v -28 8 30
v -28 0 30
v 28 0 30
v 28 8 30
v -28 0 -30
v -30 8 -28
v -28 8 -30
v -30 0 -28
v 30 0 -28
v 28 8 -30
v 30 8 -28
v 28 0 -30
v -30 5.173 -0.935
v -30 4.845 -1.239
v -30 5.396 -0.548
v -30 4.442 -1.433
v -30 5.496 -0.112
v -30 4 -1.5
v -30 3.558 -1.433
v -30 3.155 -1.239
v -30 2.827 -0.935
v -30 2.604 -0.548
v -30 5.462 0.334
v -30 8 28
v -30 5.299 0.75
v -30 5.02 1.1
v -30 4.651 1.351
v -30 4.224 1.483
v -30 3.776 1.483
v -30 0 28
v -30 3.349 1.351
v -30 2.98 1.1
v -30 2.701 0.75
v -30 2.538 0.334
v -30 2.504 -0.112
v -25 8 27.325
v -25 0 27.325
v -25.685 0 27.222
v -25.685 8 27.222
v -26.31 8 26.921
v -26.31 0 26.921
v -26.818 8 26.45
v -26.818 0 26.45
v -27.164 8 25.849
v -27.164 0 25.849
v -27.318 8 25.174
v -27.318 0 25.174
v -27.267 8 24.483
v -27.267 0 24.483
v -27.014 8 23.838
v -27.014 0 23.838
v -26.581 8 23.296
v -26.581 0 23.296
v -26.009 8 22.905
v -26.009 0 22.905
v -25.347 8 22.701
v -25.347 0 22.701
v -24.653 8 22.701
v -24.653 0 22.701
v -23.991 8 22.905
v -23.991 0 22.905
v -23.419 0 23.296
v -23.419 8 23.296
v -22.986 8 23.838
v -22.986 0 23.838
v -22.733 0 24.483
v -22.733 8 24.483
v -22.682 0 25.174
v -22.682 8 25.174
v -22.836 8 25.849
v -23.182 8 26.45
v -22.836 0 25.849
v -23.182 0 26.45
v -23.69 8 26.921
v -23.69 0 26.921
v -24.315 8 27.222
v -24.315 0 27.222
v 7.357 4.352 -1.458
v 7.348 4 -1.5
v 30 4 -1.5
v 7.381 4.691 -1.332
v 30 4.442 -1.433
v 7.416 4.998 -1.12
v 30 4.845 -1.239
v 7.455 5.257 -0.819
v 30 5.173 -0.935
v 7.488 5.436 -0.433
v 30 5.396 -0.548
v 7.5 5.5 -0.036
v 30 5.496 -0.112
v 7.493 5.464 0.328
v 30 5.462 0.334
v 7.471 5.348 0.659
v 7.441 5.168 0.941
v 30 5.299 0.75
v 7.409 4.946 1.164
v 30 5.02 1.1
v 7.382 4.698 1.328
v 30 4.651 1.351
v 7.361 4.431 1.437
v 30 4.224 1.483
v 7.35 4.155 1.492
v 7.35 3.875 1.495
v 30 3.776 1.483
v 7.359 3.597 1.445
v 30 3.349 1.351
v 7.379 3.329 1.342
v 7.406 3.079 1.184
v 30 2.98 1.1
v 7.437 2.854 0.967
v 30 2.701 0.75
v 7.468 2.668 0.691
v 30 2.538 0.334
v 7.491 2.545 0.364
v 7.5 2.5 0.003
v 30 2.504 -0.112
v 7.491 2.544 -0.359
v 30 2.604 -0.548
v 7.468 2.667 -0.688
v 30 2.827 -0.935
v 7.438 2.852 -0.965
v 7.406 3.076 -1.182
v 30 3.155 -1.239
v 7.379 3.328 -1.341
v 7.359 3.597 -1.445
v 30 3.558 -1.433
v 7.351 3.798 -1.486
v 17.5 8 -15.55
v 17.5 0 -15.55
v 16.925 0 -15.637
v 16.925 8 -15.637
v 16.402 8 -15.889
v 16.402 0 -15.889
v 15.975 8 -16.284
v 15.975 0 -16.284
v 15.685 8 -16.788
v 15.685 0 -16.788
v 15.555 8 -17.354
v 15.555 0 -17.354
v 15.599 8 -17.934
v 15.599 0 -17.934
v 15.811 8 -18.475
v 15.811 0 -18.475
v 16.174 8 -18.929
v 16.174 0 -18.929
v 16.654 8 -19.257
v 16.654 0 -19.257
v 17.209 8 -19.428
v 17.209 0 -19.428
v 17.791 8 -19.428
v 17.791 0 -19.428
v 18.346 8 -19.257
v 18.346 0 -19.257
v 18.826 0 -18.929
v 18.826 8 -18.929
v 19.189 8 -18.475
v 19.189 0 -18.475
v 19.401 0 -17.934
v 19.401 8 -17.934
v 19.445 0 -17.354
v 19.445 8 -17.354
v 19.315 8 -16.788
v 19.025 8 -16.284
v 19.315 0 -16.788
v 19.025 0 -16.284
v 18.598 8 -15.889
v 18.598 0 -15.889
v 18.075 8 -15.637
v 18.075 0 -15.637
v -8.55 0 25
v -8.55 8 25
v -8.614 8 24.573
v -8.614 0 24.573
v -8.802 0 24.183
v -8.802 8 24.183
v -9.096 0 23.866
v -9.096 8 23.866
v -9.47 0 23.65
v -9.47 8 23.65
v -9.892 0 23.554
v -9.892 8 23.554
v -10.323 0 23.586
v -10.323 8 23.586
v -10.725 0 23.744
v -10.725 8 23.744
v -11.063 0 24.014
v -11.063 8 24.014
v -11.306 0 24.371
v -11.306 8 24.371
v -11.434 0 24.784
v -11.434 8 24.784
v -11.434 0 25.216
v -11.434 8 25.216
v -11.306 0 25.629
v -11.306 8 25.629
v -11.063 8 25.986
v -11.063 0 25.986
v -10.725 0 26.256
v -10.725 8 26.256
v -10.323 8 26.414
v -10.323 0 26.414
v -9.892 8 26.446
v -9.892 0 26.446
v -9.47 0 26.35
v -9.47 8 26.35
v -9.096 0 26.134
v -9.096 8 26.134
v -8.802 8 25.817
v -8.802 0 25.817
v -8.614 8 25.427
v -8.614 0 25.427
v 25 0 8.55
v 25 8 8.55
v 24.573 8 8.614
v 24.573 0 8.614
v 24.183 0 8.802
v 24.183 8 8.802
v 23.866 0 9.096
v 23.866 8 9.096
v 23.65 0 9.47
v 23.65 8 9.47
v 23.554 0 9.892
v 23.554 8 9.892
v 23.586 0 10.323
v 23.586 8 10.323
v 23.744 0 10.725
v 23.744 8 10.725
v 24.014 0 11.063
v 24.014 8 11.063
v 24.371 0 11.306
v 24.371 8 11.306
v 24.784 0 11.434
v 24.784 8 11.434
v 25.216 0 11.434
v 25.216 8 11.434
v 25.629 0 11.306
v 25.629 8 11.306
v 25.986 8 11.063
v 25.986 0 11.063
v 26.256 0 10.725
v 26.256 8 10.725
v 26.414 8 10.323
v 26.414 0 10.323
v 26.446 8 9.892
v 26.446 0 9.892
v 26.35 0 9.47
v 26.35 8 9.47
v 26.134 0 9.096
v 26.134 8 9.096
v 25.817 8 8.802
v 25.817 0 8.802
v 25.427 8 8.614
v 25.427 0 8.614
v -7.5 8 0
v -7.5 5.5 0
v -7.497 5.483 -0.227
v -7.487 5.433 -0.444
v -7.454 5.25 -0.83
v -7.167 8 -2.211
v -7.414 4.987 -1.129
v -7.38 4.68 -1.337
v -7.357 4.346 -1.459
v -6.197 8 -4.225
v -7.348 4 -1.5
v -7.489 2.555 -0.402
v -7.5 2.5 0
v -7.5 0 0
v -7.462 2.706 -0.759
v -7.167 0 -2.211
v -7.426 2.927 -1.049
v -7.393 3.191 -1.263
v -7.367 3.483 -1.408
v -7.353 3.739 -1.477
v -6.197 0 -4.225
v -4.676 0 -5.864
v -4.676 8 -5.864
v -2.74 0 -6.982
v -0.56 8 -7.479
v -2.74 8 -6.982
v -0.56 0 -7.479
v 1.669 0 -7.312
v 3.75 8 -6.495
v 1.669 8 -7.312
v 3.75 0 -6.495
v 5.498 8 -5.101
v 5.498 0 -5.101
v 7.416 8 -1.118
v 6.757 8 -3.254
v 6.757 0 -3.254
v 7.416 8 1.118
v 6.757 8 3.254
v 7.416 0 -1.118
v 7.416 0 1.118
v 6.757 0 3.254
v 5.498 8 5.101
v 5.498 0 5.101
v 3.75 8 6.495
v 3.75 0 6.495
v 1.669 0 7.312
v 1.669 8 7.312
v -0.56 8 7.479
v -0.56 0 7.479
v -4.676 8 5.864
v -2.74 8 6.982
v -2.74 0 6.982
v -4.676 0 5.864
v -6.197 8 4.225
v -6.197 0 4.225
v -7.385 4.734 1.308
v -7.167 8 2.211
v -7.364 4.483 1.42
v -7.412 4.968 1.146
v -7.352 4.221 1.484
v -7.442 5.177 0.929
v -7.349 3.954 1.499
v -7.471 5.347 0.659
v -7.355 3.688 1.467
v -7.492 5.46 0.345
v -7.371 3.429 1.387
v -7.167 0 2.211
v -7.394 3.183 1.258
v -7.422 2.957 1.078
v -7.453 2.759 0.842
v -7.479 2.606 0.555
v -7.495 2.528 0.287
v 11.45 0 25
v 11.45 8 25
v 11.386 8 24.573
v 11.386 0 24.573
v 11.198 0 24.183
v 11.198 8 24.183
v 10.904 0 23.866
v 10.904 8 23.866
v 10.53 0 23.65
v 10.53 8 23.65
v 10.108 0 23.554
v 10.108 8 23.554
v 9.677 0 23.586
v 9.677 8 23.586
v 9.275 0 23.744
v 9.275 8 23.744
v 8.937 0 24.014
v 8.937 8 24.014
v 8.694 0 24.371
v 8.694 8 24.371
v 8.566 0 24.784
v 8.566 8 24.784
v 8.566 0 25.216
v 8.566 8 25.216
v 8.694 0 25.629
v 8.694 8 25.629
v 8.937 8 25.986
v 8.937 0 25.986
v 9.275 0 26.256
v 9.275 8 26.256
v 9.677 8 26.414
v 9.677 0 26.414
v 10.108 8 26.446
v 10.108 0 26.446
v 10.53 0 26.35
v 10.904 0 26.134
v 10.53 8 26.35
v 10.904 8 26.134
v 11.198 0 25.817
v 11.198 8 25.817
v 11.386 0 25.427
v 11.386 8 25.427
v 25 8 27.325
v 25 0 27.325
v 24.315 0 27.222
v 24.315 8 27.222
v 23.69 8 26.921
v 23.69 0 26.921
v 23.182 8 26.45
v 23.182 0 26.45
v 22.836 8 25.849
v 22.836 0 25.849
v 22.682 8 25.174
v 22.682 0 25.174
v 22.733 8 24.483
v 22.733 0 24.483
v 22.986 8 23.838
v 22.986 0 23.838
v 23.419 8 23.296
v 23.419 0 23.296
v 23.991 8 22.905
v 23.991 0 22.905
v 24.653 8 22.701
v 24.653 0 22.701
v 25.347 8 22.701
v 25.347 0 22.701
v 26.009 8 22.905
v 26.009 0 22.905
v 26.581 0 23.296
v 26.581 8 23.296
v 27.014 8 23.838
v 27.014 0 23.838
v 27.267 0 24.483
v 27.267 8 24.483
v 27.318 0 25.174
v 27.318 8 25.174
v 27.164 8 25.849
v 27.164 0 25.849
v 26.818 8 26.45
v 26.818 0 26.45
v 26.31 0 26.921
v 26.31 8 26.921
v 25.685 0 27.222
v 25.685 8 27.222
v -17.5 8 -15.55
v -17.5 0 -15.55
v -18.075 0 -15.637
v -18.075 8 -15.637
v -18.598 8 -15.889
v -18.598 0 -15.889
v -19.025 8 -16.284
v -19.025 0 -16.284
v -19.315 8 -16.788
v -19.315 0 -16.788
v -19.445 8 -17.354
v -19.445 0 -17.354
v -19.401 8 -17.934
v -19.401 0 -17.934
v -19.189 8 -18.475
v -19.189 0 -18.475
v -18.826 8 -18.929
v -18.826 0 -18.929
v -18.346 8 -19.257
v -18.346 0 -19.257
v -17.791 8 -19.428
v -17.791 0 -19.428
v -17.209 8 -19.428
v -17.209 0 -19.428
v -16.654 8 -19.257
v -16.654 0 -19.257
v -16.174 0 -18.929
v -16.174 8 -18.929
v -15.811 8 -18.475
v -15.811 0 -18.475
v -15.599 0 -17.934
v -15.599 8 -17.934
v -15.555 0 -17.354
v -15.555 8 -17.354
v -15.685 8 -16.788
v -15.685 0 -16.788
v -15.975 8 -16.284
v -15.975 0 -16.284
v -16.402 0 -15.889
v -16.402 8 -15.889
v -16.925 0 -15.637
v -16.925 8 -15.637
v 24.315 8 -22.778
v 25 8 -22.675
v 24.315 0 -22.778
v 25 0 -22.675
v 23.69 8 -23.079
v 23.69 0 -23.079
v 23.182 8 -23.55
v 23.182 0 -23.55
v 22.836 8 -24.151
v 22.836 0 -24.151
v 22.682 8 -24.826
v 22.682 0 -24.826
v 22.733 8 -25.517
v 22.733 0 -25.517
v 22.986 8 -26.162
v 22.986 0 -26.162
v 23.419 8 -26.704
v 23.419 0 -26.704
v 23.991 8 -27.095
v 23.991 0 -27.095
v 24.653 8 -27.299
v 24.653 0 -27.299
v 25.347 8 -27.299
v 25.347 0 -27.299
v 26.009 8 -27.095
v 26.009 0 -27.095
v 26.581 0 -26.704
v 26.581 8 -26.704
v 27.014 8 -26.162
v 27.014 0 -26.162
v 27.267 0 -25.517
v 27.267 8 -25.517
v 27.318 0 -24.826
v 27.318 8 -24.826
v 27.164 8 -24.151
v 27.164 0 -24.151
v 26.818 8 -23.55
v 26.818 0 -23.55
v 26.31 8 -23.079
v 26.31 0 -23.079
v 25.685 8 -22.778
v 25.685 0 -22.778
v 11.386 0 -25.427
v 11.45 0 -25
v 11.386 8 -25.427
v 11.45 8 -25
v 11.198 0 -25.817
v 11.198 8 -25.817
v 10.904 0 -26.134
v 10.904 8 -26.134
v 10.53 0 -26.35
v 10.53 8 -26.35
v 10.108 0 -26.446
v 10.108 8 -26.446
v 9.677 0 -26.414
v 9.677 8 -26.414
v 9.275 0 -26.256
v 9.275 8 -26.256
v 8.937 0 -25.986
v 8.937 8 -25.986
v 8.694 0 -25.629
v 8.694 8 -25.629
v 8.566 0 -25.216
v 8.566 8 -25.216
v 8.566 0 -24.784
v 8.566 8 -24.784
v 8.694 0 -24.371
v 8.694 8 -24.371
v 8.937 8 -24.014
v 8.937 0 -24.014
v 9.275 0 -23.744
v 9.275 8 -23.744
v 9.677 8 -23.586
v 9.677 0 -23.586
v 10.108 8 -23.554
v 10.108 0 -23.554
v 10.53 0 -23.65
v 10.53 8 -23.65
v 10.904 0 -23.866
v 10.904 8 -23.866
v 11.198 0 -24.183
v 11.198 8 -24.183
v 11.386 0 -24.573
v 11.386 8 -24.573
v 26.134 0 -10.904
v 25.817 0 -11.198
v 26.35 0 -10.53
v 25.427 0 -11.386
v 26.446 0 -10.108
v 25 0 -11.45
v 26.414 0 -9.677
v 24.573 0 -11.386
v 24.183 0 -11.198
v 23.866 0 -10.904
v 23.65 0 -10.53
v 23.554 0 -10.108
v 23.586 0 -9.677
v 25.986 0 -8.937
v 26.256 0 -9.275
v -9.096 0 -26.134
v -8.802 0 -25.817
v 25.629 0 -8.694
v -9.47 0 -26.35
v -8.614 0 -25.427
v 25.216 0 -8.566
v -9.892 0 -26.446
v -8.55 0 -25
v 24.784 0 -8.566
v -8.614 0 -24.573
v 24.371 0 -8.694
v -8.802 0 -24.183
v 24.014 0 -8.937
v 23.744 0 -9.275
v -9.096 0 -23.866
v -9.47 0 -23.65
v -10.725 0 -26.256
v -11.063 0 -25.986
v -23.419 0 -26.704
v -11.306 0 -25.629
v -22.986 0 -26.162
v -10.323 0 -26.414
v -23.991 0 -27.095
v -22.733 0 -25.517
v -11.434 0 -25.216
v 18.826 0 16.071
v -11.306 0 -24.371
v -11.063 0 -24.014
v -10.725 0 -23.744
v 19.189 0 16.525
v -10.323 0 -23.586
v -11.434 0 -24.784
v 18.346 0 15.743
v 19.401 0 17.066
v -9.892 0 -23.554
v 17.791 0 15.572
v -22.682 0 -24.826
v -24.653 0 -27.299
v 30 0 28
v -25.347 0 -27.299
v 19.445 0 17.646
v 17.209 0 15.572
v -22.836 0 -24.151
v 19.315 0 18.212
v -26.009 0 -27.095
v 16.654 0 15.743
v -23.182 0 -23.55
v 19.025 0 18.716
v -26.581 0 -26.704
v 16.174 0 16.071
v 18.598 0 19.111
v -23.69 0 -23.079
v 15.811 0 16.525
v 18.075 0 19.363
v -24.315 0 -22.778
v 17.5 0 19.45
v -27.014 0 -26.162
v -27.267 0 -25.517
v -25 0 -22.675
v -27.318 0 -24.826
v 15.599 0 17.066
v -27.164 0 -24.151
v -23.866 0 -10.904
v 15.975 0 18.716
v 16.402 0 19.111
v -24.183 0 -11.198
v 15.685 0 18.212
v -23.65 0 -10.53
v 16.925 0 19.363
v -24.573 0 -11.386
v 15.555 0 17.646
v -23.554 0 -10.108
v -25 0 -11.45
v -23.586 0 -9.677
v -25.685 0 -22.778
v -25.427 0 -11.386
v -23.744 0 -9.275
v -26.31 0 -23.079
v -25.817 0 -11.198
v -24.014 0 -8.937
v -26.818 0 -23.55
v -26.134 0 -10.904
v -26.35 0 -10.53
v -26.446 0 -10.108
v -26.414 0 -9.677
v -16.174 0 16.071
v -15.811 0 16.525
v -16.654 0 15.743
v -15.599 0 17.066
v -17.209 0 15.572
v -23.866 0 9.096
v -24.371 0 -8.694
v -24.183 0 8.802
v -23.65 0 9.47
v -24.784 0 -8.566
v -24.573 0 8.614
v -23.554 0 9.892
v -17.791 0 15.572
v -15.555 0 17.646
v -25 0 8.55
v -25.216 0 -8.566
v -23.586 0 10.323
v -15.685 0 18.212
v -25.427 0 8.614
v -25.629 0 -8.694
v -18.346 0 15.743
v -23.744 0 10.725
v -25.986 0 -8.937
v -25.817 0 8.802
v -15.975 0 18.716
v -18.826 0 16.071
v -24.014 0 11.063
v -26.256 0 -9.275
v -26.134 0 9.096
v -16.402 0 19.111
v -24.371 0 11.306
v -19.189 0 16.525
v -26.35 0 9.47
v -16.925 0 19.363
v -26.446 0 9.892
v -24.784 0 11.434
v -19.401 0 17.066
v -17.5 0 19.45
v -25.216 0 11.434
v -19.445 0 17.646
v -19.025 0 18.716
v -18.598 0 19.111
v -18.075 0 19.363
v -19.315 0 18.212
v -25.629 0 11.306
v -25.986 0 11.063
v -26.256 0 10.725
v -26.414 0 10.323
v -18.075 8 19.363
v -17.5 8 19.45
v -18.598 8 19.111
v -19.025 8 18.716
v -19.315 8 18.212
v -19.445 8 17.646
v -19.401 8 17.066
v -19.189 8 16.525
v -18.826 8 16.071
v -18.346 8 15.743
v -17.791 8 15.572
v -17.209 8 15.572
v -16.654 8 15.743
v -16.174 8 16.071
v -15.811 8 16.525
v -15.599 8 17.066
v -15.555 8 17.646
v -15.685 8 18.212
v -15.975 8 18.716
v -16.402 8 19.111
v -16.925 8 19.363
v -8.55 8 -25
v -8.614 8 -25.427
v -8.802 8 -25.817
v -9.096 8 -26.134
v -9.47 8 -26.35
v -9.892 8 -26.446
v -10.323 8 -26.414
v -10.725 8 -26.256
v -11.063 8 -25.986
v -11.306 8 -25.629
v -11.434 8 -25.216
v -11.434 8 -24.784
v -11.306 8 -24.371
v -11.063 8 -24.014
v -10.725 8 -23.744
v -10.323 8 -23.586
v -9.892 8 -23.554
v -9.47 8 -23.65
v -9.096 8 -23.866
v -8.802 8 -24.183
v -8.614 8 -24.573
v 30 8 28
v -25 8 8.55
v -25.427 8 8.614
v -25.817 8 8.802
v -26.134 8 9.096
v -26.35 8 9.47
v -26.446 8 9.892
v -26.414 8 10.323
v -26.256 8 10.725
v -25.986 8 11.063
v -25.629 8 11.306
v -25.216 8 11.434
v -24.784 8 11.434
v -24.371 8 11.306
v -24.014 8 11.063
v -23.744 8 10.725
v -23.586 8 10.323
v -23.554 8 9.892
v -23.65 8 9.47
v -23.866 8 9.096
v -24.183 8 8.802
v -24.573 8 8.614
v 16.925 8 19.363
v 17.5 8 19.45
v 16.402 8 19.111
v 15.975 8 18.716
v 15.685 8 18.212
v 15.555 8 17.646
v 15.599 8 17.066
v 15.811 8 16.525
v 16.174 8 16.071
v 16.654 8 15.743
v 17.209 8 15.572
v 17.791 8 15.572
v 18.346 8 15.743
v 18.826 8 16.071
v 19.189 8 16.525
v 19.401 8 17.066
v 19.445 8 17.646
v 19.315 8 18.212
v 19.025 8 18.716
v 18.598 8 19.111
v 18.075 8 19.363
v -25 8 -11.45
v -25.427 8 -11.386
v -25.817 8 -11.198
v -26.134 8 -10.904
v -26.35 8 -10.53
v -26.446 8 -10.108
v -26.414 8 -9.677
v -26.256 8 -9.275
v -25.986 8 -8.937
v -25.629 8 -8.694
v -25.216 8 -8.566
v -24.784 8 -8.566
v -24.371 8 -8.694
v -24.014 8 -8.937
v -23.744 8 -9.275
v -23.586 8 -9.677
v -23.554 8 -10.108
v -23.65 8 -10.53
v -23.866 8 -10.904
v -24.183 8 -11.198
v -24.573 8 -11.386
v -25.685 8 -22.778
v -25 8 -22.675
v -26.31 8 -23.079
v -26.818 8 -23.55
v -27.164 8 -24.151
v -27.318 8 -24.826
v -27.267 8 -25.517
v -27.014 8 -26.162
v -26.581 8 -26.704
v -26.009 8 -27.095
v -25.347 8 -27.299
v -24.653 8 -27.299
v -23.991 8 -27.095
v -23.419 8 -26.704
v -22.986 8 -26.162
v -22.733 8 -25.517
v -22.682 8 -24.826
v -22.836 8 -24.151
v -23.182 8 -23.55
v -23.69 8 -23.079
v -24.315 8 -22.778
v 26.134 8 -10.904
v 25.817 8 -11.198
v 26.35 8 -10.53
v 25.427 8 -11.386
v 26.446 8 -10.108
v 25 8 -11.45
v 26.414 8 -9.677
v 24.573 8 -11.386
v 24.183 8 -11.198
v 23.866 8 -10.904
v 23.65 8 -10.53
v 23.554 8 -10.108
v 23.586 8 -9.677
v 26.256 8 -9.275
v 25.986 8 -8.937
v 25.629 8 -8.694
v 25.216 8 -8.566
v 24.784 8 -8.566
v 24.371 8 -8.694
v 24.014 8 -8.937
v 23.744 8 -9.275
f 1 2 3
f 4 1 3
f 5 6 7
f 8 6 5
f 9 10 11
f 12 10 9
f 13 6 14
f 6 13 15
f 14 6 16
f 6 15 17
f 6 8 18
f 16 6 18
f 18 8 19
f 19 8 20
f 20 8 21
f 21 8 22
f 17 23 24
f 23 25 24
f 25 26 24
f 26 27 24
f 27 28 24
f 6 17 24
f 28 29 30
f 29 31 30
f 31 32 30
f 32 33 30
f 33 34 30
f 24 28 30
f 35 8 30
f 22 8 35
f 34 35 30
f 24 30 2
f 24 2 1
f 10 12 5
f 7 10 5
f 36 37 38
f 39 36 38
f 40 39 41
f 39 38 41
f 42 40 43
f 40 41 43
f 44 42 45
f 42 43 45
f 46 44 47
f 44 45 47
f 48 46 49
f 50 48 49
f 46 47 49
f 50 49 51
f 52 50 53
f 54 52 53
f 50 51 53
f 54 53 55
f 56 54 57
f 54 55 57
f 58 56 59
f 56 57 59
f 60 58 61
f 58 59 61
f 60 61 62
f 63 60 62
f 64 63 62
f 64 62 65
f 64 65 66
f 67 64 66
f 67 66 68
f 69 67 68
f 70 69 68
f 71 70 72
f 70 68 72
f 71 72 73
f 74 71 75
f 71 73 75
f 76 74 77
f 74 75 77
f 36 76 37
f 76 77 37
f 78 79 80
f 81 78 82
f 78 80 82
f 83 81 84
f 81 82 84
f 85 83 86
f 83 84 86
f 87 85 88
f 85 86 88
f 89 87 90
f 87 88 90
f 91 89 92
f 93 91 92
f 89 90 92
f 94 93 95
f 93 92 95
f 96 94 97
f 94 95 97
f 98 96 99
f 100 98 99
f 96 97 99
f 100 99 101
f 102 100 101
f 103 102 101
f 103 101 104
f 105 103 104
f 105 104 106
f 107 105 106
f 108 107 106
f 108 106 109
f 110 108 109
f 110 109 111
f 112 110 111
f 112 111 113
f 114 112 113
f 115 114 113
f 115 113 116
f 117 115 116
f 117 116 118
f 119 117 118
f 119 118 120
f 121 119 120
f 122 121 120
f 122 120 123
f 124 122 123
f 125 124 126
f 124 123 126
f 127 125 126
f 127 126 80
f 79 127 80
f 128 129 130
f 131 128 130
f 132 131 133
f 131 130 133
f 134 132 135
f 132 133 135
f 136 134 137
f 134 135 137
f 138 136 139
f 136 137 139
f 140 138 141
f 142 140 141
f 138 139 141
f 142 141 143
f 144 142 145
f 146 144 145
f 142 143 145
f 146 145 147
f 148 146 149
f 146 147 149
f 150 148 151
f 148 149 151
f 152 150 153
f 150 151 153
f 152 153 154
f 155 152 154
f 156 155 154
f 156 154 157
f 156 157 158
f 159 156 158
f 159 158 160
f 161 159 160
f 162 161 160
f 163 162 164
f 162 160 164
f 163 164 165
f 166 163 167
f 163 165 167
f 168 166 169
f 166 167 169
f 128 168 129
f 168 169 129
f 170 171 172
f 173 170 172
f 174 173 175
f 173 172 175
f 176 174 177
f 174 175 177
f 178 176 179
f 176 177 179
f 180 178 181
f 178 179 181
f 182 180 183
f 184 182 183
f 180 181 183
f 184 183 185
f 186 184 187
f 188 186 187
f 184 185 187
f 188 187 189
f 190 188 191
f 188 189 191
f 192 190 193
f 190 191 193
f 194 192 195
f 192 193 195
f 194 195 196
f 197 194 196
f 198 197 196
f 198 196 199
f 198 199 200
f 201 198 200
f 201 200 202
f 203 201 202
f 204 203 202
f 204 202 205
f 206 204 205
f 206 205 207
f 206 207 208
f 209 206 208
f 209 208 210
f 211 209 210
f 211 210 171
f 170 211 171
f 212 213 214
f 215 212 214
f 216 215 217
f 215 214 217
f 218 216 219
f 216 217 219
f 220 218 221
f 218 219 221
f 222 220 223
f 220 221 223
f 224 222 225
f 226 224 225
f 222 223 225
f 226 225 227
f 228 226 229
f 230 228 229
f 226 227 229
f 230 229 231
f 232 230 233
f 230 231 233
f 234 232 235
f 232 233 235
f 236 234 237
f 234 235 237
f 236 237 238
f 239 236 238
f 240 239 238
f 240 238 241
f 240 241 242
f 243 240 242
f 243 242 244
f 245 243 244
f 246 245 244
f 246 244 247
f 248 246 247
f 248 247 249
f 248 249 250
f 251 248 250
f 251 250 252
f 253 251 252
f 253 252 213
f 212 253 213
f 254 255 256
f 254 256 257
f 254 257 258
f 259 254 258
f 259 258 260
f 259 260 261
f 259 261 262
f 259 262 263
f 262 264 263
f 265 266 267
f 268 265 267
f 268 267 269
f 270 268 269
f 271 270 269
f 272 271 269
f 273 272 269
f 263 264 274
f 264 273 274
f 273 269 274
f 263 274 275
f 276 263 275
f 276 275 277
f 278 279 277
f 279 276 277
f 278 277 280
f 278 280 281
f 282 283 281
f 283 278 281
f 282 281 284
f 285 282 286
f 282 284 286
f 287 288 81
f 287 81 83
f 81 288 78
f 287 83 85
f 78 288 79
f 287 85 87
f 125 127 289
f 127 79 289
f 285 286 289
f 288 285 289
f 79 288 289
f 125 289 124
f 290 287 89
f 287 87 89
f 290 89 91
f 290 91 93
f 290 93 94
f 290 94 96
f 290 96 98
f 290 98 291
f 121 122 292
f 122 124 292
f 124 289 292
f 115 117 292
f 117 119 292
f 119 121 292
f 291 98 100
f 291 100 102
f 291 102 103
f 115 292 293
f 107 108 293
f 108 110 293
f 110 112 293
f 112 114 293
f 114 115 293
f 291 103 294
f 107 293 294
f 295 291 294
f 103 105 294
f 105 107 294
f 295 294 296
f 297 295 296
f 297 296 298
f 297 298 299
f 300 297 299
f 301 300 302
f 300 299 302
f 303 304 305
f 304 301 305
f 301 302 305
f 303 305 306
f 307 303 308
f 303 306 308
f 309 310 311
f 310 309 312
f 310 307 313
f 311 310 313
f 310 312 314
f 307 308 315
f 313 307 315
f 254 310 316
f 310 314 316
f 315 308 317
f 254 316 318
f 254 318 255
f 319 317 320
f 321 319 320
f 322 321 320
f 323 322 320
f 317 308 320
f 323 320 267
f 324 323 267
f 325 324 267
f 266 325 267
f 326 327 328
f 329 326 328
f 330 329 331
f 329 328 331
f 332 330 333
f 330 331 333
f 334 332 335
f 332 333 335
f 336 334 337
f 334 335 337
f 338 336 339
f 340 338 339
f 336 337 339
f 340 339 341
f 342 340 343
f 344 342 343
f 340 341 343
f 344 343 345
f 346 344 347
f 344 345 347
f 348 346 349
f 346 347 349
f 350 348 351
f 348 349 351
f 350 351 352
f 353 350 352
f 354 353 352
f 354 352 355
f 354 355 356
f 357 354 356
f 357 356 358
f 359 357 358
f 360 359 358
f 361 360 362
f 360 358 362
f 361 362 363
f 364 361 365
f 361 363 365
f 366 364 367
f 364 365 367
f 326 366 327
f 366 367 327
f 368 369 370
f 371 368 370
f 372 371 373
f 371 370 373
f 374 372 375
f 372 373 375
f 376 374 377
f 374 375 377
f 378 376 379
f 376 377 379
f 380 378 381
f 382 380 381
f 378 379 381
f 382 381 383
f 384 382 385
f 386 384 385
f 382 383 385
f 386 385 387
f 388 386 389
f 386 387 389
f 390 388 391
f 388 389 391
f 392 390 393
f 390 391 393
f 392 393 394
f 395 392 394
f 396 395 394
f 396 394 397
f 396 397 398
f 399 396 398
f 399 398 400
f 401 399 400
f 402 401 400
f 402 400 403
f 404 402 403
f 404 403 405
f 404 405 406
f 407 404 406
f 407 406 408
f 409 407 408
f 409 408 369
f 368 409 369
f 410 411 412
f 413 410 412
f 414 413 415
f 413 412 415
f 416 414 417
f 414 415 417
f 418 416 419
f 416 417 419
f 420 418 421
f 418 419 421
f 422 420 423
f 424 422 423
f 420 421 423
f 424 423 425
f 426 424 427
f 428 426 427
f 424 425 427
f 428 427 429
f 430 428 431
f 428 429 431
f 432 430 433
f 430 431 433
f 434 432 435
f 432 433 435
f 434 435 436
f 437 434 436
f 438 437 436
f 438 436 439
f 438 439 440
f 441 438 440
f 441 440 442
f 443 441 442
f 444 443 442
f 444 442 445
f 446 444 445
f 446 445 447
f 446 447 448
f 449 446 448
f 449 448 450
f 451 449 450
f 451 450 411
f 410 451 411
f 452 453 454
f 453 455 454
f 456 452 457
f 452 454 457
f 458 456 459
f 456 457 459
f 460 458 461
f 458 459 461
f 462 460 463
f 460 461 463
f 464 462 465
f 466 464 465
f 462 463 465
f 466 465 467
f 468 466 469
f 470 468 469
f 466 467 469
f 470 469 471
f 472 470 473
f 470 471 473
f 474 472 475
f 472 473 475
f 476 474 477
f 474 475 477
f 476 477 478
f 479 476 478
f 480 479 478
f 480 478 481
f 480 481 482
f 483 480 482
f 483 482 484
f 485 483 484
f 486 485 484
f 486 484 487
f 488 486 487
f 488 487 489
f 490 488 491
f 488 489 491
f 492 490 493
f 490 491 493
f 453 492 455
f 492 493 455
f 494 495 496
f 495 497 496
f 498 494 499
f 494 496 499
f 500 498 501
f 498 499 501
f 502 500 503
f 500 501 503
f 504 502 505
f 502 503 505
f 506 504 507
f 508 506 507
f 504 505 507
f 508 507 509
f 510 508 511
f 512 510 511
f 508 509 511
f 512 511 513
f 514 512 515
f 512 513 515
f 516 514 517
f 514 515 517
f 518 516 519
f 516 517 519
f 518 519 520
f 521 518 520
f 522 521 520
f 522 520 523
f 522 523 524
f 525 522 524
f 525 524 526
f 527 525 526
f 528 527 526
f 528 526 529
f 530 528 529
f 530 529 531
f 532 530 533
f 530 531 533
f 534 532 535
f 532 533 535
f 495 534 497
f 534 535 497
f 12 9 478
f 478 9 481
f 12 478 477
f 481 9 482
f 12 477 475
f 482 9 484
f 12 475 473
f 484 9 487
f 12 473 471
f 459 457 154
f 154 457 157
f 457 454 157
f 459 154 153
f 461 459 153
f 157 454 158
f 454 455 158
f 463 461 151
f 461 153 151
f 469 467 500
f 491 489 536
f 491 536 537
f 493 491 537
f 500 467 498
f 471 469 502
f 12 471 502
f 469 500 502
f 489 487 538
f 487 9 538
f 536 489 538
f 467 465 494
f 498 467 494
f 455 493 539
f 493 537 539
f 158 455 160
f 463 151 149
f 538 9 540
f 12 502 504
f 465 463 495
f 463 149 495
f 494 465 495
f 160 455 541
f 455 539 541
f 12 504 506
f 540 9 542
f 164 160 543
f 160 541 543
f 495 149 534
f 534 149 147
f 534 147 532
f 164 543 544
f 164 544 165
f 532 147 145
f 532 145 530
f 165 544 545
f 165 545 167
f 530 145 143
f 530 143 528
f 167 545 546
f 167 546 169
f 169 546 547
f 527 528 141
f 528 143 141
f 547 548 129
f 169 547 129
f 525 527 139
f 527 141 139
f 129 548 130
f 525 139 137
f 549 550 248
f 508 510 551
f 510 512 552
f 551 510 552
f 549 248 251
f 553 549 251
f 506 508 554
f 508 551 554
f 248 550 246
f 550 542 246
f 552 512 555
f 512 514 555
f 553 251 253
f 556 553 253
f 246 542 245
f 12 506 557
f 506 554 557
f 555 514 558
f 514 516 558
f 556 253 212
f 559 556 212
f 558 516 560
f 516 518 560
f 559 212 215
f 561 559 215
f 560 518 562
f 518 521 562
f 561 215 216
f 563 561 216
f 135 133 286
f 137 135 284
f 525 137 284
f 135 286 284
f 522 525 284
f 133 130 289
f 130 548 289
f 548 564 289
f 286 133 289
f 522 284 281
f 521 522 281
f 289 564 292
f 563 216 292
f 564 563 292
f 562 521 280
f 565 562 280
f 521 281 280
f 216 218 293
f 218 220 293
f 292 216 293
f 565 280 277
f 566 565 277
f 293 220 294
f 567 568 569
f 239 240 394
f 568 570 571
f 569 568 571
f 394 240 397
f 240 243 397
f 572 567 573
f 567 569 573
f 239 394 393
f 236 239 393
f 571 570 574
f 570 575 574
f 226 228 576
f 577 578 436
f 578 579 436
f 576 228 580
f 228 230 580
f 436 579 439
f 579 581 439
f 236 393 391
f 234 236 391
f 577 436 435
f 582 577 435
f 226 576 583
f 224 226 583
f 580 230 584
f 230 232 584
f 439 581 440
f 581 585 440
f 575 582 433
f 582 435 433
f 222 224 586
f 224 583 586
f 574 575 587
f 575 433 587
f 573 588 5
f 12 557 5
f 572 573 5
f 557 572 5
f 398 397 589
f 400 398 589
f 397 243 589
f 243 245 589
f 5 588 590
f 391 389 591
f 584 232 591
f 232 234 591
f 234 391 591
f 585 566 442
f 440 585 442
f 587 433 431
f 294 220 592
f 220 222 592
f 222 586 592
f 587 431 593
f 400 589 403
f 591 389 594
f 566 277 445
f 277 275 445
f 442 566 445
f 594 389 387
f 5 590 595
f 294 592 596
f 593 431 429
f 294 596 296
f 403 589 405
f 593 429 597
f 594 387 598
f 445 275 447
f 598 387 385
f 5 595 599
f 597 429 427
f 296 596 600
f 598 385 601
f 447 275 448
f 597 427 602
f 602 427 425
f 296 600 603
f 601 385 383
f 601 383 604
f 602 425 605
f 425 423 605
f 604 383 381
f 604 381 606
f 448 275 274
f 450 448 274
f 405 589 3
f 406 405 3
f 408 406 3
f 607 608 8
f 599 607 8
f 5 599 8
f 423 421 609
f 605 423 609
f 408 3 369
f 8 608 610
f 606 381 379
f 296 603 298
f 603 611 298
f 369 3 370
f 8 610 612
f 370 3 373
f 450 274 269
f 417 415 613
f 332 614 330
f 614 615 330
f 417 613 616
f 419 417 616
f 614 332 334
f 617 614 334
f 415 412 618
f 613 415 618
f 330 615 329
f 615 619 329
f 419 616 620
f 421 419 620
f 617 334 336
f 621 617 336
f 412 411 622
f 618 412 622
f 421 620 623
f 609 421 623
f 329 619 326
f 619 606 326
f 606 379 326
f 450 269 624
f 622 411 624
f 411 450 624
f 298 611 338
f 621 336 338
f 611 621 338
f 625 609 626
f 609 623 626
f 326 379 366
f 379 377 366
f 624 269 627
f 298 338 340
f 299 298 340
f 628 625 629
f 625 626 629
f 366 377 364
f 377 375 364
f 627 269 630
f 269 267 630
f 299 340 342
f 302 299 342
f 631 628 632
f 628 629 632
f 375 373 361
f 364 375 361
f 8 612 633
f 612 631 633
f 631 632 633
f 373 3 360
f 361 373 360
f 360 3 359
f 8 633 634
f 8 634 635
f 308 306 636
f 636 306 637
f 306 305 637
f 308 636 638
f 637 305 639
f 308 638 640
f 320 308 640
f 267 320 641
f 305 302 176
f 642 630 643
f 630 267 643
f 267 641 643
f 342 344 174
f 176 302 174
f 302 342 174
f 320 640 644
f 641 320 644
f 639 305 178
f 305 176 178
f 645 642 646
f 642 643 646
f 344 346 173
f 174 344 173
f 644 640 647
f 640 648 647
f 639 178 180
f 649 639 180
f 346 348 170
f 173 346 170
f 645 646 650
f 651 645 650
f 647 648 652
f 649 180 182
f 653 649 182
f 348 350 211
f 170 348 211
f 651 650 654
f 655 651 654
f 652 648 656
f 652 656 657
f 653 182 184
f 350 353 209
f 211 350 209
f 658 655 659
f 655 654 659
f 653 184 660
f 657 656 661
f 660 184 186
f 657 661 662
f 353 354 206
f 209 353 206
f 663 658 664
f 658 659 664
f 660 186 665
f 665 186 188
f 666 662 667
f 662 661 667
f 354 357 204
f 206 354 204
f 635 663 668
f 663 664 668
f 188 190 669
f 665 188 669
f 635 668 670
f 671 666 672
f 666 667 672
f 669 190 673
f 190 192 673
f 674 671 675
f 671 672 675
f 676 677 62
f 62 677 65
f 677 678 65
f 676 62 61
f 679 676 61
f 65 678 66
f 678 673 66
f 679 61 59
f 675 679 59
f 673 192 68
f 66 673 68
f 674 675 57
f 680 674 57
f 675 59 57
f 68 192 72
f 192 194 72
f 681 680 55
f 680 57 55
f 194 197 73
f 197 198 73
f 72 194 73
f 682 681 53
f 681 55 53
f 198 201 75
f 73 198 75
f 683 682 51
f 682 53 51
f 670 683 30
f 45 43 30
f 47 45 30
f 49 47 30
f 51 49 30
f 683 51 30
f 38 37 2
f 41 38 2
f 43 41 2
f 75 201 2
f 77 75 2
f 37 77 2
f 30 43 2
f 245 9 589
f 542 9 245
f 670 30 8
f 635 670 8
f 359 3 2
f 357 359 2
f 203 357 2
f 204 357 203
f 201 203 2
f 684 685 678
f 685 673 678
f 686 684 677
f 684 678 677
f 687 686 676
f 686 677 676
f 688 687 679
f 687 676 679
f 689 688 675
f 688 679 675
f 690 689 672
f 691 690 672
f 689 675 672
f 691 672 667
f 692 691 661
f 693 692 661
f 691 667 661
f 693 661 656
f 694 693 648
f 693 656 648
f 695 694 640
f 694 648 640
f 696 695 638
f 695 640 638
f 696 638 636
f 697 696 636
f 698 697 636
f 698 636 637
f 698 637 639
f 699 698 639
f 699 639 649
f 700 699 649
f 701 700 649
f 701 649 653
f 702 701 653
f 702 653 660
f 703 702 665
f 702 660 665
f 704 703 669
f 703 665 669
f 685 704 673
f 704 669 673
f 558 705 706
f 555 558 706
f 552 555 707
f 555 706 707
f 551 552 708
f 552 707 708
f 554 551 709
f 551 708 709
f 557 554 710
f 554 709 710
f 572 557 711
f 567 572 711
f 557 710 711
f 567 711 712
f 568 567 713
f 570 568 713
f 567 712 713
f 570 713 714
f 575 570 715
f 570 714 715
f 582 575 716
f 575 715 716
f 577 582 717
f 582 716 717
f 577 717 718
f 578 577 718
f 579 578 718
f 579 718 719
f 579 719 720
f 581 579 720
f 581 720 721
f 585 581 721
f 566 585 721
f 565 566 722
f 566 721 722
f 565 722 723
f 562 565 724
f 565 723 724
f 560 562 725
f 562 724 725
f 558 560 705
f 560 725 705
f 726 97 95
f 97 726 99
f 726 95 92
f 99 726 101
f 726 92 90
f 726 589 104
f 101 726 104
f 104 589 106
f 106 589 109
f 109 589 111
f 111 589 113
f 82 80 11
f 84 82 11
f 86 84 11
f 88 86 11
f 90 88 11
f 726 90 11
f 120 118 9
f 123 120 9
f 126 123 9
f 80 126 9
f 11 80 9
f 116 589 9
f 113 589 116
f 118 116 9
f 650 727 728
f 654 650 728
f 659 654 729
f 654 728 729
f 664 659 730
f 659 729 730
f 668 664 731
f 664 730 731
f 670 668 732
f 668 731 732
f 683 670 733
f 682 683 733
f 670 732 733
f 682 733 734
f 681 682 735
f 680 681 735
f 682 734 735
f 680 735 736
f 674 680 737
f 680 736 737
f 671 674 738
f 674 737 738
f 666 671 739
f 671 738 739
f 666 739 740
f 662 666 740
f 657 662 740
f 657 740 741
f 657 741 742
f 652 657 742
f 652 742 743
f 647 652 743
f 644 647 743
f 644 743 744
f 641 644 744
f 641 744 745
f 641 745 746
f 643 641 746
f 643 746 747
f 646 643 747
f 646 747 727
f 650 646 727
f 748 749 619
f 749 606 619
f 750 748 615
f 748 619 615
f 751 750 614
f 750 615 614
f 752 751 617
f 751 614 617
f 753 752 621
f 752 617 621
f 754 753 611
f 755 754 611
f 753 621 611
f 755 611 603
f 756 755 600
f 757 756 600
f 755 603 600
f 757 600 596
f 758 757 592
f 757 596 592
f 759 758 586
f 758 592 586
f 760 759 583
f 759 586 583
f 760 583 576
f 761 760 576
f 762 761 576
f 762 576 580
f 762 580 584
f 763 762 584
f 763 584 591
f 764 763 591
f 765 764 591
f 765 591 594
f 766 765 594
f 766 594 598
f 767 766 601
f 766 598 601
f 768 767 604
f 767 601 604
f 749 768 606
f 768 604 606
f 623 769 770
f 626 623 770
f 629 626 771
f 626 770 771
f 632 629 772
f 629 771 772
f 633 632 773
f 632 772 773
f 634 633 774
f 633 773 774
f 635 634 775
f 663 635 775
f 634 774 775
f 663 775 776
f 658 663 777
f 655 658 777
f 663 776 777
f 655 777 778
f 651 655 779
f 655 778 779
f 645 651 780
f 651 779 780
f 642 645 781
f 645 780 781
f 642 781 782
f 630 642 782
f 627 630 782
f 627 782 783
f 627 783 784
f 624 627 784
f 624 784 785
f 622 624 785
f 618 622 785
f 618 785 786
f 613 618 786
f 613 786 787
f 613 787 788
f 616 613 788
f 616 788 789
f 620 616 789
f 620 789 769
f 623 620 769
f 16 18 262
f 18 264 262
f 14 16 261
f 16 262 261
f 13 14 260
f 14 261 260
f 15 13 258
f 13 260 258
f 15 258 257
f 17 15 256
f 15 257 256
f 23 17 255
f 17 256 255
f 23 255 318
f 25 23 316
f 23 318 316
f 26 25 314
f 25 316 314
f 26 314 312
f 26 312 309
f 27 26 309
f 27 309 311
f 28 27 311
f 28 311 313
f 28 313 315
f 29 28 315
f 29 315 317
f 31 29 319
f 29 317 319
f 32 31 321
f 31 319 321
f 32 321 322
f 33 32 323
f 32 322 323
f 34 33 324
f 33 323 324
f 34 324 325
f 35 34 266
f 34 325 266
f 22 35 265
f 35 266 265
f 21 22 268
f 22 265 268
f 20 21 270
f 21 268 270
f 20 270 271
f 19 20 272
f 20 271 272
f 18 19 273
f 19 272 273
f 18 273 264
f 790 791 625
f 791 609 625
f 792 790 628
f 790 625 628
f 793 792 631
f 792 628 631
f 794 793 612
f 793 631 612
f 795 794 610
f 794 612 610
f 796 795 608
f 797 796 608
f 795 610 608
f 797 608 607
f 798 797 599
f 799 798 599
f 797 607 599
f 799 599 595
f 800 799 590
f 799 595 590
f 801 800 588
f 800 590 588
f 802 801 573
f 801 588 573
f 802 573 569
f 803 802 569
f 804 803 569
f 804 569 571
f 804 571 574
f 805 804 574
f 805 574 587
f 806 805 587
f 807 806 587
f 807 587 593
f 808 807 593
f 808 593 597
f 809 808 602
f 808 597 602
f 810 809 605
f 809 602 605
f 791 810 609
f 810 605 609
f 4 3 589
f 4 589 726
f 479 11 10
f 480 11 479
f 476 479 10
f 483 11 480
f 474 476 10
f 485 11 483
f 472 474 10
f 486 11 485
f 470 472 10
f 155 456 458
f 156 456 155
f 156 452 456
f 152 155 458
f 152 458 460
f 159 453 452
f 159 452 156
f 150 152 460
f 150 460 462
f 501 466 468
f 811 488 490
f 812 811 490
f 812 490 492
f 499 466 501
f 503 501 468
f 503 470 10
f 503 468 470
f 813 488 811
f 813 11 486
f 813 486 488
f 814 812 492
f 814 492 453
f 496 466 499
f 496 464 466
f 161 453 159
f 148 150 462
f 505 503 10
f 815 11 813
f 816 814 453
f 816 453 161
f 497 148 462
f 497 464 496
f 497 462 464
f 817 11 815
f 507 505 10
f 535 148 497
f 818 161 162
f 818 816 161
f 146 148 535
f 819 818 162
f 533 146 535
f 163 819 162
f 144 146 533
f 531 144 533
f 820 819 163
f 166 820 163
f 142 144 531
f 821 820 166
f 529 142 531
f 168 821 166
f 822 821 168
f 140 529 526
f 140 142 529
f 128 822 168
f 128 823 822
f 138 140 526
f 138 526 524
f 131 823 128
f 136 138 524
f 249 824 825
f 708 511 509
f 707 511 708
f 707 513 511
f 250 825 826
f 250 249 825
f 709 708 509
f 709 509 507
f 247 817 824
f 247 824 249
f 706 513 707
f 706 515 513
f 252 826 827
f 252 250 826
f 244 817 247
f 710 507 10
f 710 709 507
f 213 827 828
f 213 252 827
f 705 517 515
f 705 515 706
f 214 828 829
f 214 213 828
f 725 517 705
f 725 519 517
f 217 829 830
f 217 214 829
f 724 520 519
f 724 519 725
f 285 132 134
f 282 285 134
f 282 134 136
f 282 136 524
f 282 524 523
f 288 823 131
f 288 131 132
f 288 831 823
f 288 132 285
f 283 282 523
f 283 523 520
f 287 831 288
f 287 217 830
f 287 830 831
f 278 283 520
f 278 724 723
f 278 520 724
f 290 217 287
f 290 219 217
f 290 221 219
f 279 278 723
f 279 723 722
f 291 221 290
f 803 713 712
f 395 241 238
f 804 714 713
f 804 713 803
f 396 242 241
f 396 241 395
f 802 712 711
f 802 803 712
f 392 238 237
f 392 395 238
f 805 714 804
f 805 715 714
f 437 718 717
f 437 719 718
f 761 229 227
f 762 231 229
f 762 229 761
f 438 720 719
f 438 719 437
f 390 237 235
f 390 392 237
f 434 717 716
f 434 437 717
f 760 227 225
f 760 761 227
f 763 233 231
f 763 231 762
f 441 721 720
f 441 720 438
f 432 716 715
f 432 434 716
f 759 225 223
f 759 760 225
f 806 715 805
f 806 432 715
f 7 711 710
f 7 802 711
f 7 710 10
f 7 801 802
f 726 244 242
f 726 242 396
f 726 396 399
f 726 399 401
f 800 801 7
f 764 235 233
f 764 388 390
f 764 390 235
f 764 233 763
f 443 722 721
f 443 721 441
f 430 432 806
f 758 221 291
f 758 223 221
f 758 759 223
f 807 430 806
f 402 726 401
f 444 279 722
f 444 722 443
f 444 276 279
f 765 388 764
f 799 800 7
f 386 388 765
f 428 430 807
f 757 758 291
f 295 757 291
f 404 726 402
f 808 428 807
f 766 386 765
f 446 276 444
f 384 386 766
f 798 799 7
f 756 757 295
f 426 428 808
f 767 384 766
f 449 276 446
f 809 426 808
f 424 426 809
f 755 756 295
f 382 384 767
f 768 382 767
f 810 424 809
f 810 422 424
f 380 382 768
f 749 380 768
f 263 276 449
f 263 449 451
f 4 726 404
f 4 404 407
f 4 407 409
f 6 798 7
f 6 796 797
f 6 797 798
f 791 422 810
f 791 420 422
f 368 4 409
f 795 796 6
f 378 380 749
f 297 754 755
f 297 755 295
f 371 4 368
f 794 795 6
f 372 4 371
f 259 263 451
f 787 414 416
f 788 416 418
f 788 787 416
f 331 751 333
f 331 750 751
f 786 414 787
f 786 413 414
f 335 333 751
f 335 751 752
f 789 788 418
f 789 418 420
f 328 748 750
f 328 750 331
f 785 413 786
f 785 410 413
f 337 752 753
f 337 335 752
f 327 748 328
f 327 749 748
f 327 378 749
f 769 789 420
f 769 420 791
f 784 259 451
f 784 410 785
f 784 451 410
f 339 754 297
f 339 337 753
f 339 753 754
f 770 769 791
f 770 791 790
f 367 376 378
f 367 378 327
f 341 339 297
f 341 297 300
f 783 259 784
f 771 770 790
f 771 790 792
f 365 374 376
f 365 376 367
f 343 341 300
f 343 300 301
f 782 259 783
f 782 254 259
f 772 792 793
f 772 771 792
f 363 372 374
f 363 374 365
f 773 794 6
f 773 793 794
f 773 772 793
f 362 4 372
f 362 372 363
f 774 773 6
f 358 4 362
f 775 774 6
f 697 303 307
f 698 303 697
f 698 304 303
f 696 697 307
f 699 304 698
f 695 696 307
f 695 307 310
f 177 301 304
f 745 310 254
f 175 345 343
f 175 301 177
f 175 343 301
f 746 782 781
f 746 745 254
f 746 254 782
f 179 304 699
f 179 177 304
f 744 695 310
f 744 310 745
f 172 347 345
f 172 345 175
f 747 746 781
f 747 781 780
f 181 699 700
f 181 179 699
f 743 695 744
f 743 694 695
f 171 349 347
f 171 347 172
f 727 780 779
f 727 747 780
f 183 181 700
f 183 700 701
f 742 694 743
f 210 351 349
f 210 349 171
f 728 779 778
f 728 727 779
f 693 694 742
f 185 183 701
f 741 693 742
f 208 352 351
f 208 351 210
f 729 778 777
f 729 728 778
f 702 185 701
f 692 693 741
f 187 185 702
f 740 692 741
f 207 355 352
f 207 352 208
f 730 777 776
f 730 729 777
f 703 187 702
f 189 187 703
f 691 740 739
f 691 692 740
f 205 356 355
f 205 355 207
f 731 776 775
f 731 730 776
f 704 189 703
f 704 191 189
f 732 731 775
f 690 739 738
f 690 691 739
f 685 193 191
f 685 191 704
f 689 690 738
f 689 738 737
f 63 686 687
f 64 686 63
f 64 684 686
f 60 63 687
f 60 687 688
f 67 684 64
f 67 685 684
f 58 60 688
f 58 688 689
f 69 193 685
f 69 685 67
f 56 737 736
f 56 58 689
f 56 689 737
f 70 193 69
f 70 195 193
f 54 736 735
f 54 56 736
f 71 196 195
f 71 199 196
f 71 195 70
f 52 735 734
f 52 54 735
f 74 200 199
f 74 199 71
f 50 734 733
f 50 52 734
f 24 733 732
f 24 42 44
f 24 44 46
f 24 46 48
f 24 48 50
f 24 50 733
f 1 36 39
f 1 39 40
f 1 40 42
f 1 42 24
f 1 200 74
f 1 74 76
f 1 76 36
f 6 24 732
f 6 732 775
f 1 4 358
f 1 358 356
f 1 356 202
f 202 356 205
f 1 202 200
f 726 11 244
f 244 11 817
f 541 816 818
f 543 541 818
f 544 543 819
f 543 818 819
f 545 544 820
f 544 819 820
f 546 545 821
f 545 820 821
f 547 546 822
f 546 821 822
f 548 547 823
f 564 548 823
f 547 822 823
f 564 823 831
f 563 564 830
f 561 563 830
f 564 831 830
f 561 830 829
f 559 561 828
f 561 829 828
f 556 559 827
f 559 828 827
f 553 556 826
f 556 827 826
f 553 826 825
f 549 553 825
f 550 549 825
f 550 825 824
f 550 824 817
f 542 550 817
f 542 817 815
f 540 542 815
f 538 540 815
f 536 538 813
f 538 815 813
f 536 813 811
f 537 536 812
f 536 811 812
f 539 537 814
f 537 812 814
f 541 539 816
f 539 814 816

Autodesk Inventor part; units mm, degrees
ref_plane "YZ Plane" through (0, 0, 0) normal (1, 0, 0) x (0, 1, 0)
ref_plane "XZ Plane" through (0, 0, 0) normal (0, 1, 0) x (-1, 0, 0)
ref_plane "XY Plane" through (0, 0, 0) normal (0, 0, 1) x (1, 0, 0)
sketch "Sketch1" plane through (0, 0, 0) normal (0, 1, 0) x (-1, 0, 0)
  line L0 (-30, -30) -> (30, -30)
  line L1 (30, -30) -> (30, 30)
  line L2 (30, 30) -> (-30, 30)
  line L3 (-30, 30) -> (-30, -30)
  line L4 (-30, -30) -> (30, 30) construction
  line L5 (30, -30) -> (-30, 30) construction
  circle A0 centre (0, 0) radius 7.5
  circle A1 centre (-25, 25) radius 1.95 projected
  circle A2 centre (0, 25) radius 1.95 projected
  circle A3 centre (0, 25) radius 1.95 projected
  circle A4 centre (25, 0) radius 1.95 projected
  circle A5 centre (25, -25) radius 1.95 projected
  circle A6 centre (-25, 25) radius 1.95 projected
  circle A7 centre (-25, -25) radius 1.95 projected
  circle A8 centre (25, 25) radius 1.95 projected
  circle A9 centre (-25, 0) radius 1.95 projected
  circle A10 centre (0, -25) radius 1.95 projected
  line L6 (28, 30) -> (30, 28) projected
  line L7 (30, 28) -> (30, -28) projected
  line L8 (30, -28) -> (28, -30) projected
  line L9 (28, -30) -> (-28, -30) projected
  line L10 (-28, -30) -> (-30, -28) projected
  line L11 (-30, -28) -> (-30, 28) projected
  line L12 (-30, 28) -> (-28, 30) projected
  line L13 (-28, 30) -> (28, 30) projected
  dimension "d0" = 60
  dimension "d1" = 60
  dimension "d13" = 15
extrude "Extrusion1" add sketch "Sketch1" along normal blind 8 contours L3 L10 L0 | L10 L3 L12 L2 L6 L1 L8 L0 | L8 L1 L0 | L3 L2 L12 | L6 L2 L1 | A1 | A2 | A4 | A5 | A7 | A8 | A9 | A10
sketch "Sketch2" plane through (0, 8, 0) normal (0, 1, 0) x (1, 0, 0)
  line L0 (30, 30) -> (-30, 30) projected
  line L1 (-30, 30) -> (-30, -30) projected
  line L2 (-30, -30) -> (30, -30) projected
  line L3 (30, -30) -> (30, 30) projected
  line L4 (17.5, -17.5) -> (-17.5, -17.5)
  line L5 (-17.5, -17.5) -> (-17.5, 17.5)
  line L6 (-17.5, 17.5) -> (17.5, 17.5)
  line L7 (17.5, 17.5) -> (17.5, -17.5)
  line L8 (17.5, -17.5) -> (-17.5, 17.5) construction
  line L9 (-17.5, -17.5) -> (17.5, 17.5) construction
  line L10 (0, -17.5) -> (0, 17.5)
  line L11 (-17.5, 0) -> (17.5, 0)
  point P0 (0, 0)
  dimension "d4" = 35
  dimension "d5" = 35
hole "Hole1" at (-17.5, 8, 17.5) at (-17.5, 8, -17.5) at (17.5, 8, -17.5) at (17.5, 8, 17.5) direction (0, -1, 0) diameter 3.9 depth 10 tip angle 118
chamfer "Chamfer1" distance 2 angle 45 4 edges at (30, 4, 30) (30, 4, -30) (-30, 4, -30) (-30, 4, 30)
sketch "Sketch3" plane through (0, 8, 0) normal (0, 1, 0) x (1, 0, 0)
  line L0 (-28, -30) -> (-30, -28) projected
  line L1 (-28, -30) -> (28, -30) projected
  line L2 (30, -28) -> (28, -30) projected
  line L3 (30, -28) -> (30, 28) projected
  line L4 (28, 30) -> (30, 28) projected
  line L5 (28, 30) -> (-28, 30) projected
  line L6 (-30, 28) -> (-28, 30) projected
  line L7 (-30, 28) -> (-30, -28) projected
  circle A0 centre (17.5, 17.5) radius 1.95 projected
  circle A1 centre (-17.5, -17.5) radius 1.95 projected
  circle A2 centre (-17.5, 17.5) radius 1.95 projected
  circle A3 centre (17.5, -17.5) radius 1.95 projected
  circle A4 centre (0, 0) radius 7.5 projected
  line L8 (25, -25) -> (-25, -25)
  line L9 (-25, -25) -> (-25, 25)
  line L10 (-25, 25) -> (25, 25)
  line L11 (25, 25) -> (25, -25)
  line L12 (25, -25) -> (-25, 25) construction
  line L13 (-25, -25) -> (25, 25) construction
  dimension "d17" = 50
  dimension "d18" = 50
hole "Hole2" at (-25, 8, -25) at (25, 8, -25) at (25, 8, 25) at (-25, 8, 25) direction (0, -1, 0) diameter 4.65 end through all
sketch "Sketch4" plane through (30, 0, 28) normal (1, 0, 0) x (0, 0, -1)
  line L0 (56, 8) -> (56, 0) projected
  line L1 (0, 8) -> (56, 8) projected
  line L2 (0, 0) -> (0, 8) projected
  line L3 (0, 0) -> (56, 0) projected
  circle A0 centre (28, 4) radius 1.5
  line L4 (-2, 8) -> (-2, 0) projected
  point P0 (28, 0)
  dimension "d26" = 3
  dimension "d27" = 4
  dimension "d28" = 30
extrude "Extrusion2" cut sketch "Sketch4" against normal through all contours A0
sketch "Sketch5" plane through (0, 8, 0) normal (0, 1, 0) x (1, 0, 0)
  circle A0 centre (25, -25) radius 2.325 projected
  circle A1 centre (-25, -25) radius 2.325 projected
  circle A2 centre (25, 25) radius 2.325 projected
  circle A3 centre (-25, 25) radius 2.325 projected
  circle A4 centre (10, -25) radius 1.45
  circle A5 centre (-10, -25) radius 1.45
  circle A6 centre (10, 25) radius 1.45
  circle A7 centre (-10, 25) radius 1.45
  point P0 (0, 0)
  dimension "d31" = 2.9
  dimension "d32" = 2.9
  dimension "d33" = 15
  dimension "d34" = 15
  dimension "d35" = 2.9
  dimension "d36" = 2.9
extrude "Extrusion3" cut sketch "Sketch5" against normal blind 10 contours A4 | A5 | A6 | A7
pattern_circular "Circular Pattern1" count 2 over 90 about axis through (0, 0, 0) along (0, 1, 0) of "Extrusion3"
properties part number "00_XY_stage-CHUO_SEIKI_LD-647-R1-Top"
